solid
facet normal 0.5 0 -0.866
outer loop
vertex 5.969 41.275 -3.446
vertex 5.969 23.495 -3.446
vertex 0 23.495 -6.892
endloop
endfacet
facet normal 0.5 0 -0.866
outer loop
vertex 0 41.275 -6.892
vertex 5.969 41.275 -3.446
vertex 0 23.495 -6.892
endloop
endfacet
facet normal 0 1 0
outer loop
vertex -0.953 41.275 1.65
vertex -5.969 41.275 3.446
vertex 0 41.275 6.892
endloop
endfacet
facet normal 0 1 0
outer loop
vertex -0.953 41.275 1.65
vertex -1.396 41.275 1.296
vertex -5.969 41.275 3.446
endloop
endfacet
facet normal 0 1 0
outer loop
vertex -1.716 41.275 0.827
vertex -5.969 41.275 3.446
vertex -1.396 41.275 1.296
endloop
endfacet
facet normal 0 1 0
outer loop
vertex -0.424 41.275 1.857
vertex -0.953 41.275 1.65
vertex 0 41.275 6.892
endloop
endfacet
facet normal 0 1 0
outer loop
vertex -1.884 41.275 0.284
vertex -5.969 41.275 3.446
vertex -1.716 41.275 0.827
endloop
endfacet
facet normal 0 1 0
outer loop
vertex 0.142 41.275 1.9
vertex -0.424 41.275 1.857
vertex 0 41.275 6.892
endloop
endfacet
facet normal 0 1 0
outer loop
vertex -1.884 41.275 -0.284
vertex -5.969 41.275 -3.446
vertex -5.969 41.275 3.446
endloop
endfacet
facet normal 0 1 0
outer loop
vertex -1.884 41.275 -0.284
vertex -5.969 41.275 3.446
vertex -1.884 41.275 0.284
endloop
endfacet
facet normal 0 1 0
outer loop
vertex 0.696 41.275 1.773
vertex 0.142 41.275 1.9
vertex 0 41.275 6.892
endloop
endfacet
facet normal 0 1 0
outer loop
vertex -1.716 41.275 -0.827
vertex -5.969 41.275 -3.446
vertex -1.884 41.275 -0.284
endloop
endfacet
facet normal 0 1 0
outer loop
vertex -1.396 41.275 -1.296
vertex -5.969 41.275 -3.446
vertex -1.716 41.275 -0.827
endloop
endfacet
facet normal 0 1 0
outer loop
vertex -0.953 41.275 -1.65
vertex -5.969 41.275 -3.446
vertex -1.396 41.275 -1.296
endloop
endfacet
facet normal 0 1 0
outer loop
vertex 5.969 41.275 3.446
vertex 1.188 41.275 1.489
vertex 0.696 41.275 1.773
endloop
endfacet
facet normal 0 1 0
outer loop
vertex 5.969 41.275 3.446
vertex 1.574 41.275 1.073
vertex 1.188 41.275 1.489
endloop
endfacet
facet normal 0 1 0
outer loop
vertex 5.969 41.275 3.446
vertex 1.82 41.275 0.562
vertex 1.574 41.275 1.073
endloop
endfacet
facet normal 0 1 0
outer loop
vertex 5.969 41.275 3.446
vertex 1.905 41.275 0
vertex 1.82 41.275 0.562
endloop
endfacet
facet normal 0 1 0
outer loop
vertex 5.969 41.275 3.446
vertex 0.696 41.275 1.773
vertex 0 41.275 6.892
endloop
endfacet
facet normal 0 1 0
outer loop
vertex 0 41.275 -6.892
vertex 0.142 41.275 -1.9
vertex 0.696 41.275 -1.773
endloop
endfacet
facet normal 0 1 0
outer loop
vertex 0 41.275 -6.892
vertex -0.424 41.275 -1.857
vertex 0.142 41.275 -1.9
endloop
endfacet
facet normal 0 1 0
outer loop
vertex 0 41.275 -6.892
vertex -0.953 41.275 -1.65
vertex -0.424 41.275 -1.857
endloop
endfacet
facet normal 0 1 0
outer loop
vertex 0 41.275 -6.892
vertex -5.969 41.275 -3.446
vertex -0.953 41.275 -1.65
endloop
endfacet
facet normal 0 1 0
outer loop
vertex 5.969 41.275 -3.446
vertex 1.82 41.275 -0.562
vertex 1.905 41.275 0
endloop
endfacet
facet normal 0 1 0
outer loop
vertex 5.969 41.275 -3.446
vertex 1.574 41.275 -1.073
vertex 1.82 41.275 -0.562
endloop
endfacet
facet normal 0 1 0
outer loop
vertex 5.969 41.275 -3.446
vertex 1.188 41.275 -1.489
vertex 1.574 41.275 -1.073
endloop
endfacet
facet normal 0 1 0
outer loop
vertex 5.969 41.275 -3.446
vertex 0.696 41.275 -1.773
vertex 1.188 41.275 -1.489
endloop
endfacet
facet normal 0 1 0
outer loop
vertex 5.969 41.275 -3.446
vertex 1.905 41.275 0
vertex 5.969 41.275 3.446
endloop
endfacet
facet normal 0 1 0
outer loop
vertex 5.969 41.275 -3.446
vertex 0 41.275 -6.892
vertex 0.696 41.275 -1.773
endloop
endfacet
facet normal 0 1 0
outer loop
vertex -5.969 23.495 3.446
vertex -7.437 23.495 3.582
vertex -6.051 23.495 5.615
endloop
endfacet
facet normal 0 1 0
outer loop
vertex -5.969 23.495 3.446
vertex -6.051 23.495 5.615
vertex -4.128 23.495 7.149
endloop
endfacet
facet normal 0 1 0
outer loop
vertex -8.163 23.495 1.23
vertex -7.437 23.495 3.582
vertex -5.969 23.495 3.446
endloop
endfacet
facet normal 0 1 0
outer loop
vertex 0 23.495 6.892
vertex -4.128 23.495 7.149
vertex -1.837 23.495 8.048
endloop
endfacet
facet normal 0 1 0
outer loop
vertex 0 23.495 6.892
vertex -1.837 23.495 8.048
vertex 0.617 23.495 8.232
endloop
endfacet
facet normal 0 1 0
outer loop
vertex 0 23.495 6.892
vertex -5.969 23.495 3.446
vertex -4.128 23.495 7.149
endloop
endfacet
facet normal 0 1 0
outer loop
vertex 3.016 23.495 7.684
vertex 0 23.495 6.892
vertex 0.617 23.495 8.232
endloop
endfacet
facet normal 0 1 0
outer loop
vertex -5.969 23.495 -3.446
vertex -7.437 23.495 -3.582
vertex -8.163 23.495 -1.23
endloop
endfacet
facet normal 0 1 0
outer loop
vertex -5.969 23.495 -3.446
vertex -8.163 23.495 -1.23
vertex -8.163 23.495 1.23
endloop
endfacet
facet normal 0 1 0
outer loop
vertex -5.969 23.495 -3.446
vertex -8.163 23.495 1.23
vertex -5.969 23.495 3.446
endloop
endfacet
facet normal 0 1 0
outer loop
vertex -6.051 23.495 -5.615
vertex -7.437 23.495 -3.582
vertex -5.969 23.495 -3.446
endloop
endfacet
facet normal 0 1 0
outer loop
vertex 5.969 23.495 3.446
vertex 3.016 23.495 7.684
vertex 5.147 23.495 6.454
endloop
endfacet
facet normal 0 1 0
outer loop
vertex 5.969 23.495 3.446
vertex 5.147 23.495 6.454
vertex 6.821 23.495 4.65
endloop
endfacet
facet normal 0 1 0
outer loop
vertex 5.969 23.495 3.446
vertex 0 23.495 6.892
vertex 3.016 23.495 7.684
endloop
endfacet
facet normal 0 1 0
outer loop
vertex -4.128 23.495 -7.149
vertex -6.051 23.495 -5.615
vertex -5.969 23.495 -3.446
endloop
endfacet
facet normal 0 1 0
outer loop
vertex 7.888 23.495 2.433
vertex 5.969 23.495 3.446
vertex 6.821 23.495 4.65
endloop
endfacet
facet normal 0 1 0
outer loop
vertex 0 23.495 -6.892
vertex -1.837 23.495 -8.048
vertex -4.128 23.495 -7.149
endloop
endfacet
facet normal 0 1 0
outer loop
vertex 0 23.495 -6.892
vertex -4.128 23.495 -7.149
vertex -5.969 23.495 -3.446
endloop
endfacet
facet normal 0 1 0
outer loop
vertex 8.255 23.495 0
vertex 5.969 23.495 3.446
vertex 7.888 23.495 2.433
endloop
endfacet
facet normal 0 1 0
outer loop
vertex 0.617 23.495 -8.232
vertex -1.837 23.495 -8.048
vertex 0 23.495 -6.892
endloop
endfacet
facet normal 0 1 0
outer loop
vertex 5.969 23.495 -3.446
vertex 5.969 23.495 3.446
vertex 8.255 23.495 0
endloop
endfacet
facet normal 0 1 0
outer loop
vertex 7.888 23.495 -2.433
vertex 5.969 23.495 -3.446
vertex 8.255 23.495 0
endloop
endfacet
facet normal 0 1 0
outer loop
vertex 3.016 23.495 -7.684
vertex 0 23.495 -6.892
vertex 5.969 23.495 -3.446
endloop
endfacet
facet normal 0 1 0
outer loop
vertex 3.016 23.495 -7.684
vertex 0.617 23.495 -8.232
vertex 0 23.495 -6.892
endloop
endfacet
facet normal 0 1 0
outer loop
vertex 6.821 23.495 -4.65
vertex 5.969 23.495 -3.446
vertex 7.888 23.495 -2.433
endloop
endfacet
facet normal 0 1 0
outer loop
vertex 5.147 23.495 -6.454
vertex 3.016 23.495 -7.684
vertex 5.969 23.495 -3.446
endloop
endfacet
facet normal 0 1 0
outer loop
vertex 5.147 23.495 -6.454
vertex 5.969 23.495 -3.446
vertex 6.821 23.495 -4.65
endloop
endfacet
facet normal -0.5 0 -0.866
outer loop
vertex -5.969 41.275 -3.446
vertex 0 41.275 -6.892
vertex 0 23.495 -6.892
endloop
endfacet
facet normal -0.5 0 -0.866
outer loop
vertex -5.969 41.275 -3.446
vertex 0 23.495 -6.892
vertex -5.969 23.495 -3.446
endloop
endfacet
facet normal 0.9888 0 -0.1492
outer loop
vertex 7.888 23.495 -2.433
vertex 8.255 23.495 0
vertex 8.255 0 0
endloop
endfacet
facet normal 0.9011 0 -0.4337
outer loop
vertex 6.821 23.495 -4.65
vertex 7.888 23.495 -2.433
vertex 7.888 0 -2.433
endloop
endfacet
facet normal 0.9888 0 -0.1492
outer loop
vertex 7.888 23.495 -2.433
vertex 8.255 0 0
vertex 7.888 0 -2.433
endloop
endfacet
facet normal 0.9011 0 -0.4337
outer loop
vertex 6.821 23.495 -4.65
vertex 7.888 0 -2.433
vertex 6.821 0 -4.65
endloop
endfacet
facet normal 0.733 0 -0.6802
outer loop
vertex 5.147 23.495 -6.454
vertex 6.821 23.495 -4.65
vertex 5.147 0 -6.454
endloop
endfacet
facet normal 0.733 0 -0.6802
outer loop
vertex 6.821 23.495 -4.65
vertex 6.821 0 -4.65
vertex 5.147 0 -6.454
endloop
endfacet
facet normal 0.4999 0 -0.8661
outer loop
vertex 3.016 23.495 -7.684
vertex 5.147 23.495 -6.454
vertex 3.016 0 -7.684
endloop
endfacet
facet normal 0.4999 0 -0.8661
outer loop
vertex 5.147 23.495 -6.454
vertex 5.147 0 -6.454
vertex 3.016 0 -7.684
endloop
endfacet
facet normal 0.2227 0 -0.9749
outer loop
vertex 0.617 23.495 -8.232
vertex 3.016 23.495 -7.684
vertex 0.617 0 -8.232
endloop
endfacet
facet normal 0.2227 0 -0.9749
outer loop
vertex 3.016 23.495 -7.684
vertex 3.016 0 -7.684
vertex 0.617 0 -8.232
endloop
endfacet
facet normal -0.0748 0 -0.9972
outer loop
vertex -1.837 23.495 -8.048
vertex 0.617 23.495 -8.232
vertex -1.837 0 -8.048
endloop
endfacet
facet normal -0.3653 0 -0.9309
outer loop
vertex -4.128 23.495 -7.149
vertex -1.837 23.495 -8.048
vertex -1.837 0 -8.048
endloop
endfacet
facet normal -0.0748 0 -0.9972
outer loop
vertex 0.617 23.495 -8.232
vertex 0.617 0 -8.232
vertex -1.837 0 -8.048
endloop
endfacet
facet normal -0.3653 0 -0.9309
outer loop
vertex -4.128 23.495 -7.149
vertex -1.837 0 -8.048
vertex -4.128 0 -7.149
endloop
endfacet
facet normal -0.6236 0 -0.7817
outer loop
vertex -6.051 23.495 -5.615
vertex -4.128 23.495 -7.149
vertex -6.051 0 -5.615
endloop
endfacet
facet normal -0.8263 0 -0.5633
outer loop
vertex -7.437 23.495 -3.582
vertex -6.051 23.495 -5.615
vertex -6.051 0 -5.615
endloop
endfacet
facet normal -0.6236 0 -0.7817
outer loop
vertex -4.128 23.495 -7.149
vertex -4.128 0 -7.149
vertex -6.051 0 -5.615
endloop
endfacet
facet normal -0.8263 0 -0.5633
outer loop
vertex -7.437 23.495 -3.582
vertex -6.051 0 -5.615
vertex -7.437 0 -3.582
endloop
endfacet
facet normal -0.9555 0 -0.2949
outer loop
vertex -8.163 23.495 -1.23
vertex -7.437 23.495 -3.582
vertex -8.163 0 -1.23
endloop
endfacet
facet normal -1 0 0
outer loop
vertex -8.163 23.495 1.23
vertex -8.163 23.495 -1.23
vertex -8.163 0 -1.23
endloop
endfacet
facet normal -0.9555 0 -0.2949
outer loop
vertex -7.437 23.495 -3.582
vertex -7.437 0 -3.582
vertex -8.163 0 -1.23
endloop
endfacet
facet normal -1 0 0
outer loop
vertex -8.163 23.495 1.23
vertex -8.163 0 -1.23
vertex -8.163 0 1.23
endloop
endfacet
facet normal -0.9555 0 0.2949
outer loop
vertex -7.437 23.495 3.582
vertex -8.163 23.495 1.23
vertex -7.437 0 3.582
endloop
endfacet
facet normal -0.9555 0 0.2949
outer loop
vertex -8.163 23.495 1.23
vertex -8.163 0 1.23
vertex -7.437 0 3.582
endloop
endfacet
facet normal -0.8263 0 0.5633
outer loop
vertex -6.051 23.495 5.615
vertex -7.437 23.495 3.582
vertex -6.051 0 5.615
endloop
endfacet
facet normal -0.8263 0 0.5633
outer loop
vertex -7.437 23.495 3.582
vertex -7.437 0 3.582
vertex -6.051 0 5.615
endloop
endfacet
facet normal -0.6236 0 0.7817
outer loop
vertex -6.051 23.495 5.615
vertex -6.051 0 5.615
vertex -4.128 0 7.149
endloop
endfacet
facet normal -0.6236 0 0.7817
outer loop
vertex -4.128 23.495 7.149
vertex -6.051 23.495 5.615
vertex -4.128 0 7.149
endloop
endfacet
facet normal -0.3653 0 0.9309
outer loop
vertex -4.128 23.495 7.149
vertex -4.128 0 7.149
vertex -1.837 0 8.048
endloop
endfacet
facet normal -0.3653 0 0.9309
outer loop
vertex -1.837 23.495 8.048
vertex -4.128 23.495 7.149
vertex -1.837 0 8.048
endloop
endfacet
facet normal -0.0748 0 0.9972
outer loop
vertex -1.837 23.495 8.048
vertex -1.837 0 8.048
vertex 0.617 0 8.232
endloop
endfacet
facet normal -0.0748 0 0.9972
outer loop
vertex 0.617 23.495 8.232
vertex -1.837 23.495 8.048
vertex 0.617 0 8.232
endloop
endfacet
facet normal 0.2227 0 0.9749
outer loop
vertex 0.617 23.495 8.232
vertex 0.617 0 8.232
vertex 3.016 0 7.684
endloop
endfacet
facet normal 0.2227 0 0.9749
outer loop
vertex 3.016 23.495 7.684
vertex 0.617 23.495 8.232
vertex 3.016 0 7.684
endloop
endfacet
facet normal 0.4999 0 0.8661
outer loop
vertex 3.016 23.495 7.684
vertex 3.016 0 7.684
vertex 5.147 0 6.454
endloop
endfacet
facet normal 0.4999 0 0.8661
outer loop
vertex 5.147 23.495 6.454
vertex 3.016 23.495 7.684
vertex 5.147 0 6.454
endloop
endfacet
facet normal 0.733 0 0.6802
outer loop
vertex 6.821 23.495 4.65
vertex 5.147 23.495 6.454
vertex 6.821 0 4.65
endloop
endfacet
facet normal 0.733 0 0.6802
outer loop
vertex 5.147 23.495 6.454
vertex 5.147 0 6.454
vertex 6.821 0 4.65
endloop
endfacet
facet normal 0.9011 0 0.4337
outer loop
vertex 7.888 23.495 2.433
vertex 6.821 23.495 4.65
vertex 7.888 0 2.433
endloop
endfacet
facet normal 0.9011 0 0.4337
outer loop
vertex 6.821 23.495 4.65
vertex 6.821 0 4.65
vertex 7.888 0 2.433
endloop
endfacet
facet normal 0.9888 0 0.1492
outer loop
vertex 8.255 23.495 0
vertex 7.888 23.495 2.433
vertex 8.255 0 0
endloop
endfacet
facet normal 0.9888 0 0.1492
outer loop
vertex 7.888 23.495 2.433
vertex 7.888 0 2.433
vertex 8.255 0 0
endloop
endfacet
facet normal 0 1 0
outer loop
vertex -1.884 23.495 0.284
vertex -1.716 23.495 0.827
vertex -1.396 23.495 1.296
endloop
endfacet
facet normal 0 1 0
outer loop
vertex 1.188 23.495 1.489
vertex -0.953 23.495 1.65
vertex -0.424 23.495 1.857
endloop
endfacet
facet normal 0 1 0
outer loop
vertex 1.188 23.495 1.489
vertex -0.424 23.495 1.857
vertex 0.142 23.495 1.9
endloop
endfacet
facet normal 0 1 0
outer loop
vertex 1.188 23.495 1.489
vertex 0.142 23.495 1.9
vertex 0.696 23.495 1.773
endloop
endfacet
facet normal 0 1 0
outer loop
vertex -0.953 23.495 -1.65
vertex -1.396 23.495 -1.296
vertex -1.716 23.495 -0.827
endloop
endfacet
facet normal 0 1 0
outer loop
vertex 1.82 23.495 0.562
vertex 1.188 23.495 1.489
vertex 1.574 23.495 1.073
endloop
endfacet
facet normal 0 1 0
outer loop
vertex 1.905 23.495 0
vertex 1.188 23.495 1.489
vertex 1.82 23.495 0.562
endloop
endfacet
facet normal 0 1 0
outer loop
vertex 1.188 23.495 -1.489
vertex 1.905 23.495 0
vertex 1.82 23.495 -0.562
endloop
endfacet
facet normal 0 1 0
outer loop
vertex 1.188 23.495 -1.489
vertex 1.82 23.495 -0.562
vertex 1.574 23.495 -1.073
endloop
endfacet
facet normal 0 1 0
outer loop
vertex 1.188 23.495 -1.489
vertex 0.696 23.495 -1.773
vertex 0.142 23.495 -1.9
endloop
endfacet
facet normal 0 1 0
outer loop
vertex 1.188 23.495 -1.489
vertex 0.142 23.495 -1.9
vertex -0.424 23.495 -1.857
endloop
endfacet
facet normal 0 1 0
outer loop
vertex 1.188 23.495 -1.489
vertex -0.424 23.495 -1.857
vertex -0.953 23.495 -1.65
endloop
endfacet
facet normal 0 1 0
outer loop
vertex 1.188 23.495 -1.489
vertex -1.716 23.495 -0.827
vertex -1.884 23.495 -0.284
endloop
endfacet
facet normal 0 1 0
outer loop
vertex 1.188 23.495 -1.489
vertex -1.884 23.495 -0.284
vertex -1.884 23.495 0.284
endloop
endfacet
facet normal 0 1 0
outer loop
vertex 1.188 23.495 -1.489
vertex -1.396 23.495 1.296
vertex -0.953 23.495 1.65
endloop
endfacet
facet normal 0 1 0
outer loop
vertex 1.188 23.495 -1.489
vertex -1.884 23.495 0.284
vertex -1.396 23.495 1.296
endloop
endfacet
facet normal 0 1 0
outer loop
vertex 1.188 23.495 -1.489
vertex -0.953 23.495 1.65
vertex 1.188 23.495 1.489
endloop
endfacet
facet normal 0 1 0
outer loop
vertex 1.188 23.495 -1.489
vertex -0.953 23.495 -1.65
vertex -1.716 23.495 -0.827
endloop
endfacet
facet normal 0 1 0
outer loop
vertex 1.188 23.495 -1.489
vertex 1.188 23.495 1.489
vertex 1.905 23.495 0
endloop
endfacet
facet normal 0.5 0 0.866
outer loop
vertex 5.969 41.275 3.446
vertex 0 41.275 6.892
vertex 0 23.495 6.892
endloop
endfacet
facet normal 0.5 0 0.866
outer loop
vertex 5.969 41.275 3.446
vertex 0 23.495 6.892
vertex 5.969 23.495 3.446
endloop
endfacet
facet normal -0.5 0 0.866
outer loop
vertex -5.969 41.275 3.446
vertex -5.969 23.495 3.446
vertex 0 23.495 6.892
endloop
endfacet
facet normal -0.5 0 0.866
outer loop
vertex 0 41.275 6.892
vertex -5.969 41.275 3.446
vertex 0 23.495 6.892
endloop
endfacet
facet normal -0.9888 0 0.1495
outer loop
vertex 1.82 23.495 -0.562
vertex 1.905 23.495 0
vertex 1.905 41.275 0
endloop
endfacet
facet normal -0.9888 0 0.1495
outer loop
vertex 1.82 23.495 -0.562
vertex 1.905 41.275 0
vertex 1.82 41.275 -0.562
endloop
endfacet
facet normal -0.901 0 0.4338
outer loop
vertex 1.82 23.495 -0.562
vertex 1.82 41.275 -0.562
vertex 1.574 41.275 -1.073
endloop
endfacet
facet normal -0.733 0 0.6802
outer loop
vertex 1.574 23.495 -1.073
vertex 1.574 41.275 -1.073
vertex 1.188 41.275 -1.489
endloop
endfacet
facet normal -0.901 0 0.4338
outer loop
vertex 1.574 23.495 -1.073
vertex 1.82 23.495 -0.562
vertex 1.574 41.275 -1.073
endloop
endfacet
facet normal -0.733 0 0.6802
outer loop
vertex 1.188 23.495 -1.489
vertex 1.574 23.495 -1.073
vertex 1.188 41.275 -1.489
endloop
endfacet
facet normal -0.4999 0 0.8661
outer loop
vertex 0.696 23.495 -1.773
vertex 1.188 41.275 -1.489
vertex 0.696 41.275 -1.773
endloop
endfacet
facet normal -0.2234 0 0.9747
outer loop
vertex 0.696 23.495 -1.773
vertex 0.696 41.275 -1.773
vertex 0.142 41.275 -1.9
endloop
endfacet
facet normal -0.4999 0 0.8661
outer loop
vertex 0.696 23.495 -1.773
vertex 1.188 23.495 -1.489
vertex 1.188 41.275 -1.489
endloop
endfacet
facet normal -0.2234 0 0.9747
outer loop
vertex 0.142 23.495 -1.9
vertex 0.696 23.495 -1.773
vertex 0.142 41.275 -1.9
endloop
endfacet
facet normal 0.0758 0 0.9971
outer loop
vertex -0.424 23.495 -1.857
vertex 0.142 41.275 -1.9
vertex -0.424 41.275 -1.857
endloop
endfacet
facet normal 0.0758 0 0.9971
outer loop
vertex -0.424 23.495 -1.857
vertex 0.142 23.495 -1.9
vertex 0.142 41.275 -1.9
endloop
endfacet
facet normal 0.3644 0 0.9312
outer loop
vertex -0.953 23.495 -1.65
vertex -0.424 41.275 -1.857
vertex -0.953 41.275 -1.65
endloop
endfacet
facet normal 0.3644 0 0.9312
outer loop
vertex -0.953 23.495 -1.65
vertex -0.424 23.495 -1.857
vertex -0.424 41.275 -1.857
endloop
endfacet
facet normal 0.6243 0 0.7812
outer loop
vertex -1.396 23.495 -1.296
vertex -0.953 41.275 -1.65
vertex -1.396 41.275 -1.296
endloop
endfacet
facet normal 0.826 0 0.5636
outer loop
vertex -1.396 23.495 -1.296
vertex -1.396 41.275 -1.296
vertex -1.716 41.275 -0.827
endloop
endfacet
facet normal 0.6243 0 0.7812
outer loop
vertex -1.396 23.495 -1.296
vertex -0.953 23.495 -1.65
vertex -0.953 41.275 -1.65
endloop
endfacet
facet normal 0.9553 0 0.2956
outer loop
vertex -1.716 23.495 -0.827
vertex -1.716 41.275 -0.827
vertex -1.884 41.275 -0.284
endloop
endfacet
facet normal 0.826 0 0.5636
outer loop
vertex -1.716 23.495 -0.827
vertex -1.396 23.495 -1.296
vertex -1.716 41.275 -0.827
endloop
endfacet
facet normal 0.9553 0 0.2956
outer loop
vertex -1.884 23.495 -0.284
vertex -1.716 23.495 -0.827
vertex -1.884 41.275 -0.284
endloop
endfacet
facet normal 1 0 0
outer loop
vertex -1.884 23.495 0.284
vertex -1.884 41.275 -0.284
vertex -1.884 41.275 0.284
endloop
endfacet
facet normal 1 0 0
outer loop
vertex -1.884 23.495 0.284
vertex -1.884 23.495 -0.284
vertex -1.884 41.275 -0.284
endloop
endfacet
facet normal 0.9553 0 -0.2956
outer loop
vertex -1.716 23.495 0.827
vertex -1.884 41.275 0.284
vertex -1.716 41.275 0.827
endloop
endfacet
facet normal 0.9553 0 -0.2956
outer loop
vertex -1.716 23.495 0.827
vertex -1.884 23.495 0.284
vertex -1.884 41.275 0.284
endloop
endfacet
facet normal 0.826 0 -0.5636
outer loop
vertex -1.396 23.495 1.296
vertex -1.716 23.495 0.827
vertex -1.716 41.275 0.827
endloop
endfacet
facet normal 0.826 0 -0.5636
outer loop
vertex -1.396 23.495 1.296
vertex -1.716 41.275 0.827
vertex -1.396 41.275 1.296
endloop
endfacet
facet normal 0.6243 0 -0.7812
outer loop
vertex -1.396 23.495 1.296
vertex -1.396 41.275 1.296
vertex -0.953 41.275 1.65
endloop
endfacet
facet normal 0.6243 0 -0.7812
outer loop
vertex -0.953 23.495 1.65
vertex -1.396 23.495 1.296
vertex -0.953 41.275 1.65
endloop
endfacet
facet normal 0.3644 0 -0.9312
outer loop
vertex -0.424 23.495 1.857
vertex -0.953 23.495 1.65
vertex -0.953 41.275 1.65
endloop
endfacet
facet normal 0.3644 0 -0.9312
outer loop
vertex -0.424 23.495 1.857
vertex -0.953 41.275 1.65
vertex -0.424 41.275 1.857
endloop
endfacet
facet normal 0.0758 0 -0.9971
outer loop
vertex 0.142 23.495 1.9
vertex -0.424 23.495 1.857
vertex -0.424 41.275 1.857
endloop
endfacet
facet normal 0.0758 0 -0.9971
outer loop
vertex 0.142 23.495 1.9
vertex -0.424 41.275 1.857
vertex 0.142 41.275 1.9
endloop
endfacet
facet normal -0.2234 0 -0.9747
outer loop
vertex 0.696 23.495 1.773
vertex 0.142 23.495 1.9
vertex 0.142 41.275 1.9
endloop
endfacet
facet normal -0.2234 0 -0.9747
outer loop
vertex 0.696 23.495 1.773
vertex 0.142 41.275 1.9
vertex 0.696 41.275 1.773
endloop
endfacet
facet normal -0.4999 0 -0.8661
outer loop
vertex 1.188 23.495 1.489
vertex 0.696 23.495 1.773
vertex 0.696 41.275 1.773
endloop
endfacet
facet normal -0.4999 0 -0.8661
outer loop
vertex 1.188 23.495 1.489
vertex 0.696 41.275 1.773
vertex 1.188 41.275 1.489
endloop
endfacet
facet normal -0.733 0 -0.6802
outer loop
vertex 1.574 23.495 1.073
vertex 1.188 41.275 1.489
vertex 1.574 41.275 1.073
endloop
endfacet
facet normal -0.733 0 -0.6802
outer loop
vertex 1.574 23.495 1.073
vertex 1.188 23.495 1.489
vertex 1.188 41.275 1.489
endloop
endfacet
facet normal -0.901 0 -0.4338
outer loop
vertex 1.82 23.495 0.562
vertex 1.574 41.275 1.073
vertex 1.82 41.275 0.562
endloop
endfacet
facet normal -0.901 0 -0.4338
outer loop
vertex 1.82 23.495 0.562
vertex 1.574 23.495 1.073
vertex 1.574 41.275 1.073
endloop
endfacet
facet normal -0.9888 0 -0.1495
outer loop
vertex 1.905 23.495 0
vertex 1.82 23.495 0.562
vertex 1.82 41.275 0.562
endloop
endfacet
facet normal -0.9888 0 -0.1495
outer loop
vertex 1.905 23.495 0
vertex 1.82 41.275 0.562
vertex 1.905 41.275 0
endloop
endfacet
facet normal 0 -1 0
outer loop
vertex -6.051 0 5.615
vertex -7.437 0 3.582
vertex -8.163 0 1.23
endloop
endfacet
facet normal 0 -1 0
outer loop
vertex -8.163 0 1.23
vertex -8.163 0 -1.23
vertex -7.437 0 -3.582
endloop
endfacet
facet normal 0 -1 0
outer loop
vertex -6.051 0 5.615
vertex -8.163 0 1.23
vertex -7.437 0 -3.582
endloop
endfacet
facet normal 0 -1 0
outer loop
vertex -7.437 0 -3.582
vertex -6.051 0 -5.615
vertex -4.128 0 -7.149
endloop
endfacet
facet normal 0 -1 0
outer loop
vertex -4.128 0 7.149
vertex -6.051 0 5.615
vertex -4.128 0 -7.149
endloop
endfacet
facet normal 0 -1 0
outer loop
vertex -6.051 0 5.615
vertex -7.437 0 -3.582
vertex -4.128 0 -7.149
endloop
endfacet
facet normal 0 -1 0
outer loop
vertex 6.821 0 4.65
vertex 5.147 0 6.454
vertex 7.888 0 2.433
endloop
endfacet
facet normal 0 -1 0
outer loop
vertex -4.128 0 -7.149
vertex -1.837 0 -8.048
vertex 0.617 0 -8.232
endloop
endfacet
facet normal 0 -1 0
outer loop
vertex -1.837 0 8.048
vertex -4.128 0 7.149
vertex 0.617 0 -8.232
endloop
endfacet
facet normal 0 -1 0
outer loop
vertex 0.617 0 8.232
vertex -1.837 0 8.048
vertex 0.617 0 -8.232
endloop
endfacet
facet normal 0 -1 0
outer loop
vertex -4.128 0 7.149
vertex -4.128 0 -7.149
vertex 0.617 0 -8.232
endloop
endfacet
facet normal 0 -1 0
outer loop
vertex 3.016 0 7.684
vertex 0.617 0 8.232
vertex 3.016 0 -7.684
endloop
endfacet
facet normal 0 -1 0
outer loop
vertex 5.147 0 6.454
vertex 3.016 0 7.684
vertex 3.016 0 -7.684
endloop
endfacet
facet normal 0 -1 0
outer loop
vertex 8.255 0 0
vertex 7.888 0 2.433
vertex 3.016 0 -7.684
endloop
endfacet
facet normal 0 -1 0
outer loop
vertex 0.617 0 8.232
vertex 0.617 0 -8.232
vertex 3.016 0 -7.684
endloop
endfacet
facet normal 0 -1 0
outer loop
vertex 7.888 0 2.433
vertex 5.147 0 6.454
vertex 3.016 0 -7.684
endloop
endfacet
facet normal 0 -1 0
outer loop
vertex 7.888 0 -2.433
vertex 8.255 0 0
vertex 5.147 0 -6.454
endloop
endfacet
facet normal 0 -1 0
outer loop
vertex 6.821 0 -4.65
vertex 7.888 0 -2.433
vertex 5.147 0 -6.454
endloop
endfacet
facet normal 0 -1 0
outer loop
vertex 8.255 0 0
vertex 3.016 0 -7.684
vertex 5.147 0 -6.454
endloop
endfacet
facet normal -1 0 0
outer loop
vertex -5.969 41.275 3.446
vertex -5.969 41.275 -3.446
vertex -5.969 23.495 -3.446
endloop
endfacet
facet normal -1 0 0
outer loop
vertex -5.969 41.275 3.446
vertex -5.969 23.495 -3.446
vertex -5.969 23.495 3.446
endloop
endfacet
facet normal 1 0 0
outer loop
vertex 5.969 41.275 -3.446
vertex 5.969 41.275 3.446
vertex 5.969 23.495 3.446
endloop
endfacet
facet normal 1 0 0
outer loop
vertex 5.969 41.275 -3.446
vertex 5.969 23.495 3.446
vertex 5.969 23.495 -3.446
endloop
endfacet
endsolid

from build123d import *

# Parameters (mm, degrees)
SKETCH1_R           = 8.255
BOSS_EXTRUDE1_DEPTH = 23.495
SKETCH9_R           = 1.905
BOSS_EXTRUDE6_DEPTH = 17.78


with BuildPart() as part:
    # Sketch1 → Boss-Extrude1 (new body)
    with BuildSketch(Plane(origin=(0, 0, 0), x_dir=(1, 0, 0), z_dir=(0, 1, 0))):
        Circle(SKETCH1_R)
    extrude(amount=BOSS_EXTRUDE1_DEPTH)

    # Sketch9 → Boss-Extrude6 (add)
    with BuildSketch(Plane(origin=(0, 23.495, 0), x_dir=(1, 0, 0), z_dir=(0, 1, 0))):
        Polygon((0, 6.892407514), (-5.969, 3.446203757), (-5.969, -3.446203757), (0, -6.892407514), (5.969, -3.446203757), (5.969, 3.446203757), align=None)
        Circle(SKETCH9_R, mode=Mode.SUBTRACT)
    extrude(amount=BOSS_EXTRUDE6_DEPTH)


solid = part.part
